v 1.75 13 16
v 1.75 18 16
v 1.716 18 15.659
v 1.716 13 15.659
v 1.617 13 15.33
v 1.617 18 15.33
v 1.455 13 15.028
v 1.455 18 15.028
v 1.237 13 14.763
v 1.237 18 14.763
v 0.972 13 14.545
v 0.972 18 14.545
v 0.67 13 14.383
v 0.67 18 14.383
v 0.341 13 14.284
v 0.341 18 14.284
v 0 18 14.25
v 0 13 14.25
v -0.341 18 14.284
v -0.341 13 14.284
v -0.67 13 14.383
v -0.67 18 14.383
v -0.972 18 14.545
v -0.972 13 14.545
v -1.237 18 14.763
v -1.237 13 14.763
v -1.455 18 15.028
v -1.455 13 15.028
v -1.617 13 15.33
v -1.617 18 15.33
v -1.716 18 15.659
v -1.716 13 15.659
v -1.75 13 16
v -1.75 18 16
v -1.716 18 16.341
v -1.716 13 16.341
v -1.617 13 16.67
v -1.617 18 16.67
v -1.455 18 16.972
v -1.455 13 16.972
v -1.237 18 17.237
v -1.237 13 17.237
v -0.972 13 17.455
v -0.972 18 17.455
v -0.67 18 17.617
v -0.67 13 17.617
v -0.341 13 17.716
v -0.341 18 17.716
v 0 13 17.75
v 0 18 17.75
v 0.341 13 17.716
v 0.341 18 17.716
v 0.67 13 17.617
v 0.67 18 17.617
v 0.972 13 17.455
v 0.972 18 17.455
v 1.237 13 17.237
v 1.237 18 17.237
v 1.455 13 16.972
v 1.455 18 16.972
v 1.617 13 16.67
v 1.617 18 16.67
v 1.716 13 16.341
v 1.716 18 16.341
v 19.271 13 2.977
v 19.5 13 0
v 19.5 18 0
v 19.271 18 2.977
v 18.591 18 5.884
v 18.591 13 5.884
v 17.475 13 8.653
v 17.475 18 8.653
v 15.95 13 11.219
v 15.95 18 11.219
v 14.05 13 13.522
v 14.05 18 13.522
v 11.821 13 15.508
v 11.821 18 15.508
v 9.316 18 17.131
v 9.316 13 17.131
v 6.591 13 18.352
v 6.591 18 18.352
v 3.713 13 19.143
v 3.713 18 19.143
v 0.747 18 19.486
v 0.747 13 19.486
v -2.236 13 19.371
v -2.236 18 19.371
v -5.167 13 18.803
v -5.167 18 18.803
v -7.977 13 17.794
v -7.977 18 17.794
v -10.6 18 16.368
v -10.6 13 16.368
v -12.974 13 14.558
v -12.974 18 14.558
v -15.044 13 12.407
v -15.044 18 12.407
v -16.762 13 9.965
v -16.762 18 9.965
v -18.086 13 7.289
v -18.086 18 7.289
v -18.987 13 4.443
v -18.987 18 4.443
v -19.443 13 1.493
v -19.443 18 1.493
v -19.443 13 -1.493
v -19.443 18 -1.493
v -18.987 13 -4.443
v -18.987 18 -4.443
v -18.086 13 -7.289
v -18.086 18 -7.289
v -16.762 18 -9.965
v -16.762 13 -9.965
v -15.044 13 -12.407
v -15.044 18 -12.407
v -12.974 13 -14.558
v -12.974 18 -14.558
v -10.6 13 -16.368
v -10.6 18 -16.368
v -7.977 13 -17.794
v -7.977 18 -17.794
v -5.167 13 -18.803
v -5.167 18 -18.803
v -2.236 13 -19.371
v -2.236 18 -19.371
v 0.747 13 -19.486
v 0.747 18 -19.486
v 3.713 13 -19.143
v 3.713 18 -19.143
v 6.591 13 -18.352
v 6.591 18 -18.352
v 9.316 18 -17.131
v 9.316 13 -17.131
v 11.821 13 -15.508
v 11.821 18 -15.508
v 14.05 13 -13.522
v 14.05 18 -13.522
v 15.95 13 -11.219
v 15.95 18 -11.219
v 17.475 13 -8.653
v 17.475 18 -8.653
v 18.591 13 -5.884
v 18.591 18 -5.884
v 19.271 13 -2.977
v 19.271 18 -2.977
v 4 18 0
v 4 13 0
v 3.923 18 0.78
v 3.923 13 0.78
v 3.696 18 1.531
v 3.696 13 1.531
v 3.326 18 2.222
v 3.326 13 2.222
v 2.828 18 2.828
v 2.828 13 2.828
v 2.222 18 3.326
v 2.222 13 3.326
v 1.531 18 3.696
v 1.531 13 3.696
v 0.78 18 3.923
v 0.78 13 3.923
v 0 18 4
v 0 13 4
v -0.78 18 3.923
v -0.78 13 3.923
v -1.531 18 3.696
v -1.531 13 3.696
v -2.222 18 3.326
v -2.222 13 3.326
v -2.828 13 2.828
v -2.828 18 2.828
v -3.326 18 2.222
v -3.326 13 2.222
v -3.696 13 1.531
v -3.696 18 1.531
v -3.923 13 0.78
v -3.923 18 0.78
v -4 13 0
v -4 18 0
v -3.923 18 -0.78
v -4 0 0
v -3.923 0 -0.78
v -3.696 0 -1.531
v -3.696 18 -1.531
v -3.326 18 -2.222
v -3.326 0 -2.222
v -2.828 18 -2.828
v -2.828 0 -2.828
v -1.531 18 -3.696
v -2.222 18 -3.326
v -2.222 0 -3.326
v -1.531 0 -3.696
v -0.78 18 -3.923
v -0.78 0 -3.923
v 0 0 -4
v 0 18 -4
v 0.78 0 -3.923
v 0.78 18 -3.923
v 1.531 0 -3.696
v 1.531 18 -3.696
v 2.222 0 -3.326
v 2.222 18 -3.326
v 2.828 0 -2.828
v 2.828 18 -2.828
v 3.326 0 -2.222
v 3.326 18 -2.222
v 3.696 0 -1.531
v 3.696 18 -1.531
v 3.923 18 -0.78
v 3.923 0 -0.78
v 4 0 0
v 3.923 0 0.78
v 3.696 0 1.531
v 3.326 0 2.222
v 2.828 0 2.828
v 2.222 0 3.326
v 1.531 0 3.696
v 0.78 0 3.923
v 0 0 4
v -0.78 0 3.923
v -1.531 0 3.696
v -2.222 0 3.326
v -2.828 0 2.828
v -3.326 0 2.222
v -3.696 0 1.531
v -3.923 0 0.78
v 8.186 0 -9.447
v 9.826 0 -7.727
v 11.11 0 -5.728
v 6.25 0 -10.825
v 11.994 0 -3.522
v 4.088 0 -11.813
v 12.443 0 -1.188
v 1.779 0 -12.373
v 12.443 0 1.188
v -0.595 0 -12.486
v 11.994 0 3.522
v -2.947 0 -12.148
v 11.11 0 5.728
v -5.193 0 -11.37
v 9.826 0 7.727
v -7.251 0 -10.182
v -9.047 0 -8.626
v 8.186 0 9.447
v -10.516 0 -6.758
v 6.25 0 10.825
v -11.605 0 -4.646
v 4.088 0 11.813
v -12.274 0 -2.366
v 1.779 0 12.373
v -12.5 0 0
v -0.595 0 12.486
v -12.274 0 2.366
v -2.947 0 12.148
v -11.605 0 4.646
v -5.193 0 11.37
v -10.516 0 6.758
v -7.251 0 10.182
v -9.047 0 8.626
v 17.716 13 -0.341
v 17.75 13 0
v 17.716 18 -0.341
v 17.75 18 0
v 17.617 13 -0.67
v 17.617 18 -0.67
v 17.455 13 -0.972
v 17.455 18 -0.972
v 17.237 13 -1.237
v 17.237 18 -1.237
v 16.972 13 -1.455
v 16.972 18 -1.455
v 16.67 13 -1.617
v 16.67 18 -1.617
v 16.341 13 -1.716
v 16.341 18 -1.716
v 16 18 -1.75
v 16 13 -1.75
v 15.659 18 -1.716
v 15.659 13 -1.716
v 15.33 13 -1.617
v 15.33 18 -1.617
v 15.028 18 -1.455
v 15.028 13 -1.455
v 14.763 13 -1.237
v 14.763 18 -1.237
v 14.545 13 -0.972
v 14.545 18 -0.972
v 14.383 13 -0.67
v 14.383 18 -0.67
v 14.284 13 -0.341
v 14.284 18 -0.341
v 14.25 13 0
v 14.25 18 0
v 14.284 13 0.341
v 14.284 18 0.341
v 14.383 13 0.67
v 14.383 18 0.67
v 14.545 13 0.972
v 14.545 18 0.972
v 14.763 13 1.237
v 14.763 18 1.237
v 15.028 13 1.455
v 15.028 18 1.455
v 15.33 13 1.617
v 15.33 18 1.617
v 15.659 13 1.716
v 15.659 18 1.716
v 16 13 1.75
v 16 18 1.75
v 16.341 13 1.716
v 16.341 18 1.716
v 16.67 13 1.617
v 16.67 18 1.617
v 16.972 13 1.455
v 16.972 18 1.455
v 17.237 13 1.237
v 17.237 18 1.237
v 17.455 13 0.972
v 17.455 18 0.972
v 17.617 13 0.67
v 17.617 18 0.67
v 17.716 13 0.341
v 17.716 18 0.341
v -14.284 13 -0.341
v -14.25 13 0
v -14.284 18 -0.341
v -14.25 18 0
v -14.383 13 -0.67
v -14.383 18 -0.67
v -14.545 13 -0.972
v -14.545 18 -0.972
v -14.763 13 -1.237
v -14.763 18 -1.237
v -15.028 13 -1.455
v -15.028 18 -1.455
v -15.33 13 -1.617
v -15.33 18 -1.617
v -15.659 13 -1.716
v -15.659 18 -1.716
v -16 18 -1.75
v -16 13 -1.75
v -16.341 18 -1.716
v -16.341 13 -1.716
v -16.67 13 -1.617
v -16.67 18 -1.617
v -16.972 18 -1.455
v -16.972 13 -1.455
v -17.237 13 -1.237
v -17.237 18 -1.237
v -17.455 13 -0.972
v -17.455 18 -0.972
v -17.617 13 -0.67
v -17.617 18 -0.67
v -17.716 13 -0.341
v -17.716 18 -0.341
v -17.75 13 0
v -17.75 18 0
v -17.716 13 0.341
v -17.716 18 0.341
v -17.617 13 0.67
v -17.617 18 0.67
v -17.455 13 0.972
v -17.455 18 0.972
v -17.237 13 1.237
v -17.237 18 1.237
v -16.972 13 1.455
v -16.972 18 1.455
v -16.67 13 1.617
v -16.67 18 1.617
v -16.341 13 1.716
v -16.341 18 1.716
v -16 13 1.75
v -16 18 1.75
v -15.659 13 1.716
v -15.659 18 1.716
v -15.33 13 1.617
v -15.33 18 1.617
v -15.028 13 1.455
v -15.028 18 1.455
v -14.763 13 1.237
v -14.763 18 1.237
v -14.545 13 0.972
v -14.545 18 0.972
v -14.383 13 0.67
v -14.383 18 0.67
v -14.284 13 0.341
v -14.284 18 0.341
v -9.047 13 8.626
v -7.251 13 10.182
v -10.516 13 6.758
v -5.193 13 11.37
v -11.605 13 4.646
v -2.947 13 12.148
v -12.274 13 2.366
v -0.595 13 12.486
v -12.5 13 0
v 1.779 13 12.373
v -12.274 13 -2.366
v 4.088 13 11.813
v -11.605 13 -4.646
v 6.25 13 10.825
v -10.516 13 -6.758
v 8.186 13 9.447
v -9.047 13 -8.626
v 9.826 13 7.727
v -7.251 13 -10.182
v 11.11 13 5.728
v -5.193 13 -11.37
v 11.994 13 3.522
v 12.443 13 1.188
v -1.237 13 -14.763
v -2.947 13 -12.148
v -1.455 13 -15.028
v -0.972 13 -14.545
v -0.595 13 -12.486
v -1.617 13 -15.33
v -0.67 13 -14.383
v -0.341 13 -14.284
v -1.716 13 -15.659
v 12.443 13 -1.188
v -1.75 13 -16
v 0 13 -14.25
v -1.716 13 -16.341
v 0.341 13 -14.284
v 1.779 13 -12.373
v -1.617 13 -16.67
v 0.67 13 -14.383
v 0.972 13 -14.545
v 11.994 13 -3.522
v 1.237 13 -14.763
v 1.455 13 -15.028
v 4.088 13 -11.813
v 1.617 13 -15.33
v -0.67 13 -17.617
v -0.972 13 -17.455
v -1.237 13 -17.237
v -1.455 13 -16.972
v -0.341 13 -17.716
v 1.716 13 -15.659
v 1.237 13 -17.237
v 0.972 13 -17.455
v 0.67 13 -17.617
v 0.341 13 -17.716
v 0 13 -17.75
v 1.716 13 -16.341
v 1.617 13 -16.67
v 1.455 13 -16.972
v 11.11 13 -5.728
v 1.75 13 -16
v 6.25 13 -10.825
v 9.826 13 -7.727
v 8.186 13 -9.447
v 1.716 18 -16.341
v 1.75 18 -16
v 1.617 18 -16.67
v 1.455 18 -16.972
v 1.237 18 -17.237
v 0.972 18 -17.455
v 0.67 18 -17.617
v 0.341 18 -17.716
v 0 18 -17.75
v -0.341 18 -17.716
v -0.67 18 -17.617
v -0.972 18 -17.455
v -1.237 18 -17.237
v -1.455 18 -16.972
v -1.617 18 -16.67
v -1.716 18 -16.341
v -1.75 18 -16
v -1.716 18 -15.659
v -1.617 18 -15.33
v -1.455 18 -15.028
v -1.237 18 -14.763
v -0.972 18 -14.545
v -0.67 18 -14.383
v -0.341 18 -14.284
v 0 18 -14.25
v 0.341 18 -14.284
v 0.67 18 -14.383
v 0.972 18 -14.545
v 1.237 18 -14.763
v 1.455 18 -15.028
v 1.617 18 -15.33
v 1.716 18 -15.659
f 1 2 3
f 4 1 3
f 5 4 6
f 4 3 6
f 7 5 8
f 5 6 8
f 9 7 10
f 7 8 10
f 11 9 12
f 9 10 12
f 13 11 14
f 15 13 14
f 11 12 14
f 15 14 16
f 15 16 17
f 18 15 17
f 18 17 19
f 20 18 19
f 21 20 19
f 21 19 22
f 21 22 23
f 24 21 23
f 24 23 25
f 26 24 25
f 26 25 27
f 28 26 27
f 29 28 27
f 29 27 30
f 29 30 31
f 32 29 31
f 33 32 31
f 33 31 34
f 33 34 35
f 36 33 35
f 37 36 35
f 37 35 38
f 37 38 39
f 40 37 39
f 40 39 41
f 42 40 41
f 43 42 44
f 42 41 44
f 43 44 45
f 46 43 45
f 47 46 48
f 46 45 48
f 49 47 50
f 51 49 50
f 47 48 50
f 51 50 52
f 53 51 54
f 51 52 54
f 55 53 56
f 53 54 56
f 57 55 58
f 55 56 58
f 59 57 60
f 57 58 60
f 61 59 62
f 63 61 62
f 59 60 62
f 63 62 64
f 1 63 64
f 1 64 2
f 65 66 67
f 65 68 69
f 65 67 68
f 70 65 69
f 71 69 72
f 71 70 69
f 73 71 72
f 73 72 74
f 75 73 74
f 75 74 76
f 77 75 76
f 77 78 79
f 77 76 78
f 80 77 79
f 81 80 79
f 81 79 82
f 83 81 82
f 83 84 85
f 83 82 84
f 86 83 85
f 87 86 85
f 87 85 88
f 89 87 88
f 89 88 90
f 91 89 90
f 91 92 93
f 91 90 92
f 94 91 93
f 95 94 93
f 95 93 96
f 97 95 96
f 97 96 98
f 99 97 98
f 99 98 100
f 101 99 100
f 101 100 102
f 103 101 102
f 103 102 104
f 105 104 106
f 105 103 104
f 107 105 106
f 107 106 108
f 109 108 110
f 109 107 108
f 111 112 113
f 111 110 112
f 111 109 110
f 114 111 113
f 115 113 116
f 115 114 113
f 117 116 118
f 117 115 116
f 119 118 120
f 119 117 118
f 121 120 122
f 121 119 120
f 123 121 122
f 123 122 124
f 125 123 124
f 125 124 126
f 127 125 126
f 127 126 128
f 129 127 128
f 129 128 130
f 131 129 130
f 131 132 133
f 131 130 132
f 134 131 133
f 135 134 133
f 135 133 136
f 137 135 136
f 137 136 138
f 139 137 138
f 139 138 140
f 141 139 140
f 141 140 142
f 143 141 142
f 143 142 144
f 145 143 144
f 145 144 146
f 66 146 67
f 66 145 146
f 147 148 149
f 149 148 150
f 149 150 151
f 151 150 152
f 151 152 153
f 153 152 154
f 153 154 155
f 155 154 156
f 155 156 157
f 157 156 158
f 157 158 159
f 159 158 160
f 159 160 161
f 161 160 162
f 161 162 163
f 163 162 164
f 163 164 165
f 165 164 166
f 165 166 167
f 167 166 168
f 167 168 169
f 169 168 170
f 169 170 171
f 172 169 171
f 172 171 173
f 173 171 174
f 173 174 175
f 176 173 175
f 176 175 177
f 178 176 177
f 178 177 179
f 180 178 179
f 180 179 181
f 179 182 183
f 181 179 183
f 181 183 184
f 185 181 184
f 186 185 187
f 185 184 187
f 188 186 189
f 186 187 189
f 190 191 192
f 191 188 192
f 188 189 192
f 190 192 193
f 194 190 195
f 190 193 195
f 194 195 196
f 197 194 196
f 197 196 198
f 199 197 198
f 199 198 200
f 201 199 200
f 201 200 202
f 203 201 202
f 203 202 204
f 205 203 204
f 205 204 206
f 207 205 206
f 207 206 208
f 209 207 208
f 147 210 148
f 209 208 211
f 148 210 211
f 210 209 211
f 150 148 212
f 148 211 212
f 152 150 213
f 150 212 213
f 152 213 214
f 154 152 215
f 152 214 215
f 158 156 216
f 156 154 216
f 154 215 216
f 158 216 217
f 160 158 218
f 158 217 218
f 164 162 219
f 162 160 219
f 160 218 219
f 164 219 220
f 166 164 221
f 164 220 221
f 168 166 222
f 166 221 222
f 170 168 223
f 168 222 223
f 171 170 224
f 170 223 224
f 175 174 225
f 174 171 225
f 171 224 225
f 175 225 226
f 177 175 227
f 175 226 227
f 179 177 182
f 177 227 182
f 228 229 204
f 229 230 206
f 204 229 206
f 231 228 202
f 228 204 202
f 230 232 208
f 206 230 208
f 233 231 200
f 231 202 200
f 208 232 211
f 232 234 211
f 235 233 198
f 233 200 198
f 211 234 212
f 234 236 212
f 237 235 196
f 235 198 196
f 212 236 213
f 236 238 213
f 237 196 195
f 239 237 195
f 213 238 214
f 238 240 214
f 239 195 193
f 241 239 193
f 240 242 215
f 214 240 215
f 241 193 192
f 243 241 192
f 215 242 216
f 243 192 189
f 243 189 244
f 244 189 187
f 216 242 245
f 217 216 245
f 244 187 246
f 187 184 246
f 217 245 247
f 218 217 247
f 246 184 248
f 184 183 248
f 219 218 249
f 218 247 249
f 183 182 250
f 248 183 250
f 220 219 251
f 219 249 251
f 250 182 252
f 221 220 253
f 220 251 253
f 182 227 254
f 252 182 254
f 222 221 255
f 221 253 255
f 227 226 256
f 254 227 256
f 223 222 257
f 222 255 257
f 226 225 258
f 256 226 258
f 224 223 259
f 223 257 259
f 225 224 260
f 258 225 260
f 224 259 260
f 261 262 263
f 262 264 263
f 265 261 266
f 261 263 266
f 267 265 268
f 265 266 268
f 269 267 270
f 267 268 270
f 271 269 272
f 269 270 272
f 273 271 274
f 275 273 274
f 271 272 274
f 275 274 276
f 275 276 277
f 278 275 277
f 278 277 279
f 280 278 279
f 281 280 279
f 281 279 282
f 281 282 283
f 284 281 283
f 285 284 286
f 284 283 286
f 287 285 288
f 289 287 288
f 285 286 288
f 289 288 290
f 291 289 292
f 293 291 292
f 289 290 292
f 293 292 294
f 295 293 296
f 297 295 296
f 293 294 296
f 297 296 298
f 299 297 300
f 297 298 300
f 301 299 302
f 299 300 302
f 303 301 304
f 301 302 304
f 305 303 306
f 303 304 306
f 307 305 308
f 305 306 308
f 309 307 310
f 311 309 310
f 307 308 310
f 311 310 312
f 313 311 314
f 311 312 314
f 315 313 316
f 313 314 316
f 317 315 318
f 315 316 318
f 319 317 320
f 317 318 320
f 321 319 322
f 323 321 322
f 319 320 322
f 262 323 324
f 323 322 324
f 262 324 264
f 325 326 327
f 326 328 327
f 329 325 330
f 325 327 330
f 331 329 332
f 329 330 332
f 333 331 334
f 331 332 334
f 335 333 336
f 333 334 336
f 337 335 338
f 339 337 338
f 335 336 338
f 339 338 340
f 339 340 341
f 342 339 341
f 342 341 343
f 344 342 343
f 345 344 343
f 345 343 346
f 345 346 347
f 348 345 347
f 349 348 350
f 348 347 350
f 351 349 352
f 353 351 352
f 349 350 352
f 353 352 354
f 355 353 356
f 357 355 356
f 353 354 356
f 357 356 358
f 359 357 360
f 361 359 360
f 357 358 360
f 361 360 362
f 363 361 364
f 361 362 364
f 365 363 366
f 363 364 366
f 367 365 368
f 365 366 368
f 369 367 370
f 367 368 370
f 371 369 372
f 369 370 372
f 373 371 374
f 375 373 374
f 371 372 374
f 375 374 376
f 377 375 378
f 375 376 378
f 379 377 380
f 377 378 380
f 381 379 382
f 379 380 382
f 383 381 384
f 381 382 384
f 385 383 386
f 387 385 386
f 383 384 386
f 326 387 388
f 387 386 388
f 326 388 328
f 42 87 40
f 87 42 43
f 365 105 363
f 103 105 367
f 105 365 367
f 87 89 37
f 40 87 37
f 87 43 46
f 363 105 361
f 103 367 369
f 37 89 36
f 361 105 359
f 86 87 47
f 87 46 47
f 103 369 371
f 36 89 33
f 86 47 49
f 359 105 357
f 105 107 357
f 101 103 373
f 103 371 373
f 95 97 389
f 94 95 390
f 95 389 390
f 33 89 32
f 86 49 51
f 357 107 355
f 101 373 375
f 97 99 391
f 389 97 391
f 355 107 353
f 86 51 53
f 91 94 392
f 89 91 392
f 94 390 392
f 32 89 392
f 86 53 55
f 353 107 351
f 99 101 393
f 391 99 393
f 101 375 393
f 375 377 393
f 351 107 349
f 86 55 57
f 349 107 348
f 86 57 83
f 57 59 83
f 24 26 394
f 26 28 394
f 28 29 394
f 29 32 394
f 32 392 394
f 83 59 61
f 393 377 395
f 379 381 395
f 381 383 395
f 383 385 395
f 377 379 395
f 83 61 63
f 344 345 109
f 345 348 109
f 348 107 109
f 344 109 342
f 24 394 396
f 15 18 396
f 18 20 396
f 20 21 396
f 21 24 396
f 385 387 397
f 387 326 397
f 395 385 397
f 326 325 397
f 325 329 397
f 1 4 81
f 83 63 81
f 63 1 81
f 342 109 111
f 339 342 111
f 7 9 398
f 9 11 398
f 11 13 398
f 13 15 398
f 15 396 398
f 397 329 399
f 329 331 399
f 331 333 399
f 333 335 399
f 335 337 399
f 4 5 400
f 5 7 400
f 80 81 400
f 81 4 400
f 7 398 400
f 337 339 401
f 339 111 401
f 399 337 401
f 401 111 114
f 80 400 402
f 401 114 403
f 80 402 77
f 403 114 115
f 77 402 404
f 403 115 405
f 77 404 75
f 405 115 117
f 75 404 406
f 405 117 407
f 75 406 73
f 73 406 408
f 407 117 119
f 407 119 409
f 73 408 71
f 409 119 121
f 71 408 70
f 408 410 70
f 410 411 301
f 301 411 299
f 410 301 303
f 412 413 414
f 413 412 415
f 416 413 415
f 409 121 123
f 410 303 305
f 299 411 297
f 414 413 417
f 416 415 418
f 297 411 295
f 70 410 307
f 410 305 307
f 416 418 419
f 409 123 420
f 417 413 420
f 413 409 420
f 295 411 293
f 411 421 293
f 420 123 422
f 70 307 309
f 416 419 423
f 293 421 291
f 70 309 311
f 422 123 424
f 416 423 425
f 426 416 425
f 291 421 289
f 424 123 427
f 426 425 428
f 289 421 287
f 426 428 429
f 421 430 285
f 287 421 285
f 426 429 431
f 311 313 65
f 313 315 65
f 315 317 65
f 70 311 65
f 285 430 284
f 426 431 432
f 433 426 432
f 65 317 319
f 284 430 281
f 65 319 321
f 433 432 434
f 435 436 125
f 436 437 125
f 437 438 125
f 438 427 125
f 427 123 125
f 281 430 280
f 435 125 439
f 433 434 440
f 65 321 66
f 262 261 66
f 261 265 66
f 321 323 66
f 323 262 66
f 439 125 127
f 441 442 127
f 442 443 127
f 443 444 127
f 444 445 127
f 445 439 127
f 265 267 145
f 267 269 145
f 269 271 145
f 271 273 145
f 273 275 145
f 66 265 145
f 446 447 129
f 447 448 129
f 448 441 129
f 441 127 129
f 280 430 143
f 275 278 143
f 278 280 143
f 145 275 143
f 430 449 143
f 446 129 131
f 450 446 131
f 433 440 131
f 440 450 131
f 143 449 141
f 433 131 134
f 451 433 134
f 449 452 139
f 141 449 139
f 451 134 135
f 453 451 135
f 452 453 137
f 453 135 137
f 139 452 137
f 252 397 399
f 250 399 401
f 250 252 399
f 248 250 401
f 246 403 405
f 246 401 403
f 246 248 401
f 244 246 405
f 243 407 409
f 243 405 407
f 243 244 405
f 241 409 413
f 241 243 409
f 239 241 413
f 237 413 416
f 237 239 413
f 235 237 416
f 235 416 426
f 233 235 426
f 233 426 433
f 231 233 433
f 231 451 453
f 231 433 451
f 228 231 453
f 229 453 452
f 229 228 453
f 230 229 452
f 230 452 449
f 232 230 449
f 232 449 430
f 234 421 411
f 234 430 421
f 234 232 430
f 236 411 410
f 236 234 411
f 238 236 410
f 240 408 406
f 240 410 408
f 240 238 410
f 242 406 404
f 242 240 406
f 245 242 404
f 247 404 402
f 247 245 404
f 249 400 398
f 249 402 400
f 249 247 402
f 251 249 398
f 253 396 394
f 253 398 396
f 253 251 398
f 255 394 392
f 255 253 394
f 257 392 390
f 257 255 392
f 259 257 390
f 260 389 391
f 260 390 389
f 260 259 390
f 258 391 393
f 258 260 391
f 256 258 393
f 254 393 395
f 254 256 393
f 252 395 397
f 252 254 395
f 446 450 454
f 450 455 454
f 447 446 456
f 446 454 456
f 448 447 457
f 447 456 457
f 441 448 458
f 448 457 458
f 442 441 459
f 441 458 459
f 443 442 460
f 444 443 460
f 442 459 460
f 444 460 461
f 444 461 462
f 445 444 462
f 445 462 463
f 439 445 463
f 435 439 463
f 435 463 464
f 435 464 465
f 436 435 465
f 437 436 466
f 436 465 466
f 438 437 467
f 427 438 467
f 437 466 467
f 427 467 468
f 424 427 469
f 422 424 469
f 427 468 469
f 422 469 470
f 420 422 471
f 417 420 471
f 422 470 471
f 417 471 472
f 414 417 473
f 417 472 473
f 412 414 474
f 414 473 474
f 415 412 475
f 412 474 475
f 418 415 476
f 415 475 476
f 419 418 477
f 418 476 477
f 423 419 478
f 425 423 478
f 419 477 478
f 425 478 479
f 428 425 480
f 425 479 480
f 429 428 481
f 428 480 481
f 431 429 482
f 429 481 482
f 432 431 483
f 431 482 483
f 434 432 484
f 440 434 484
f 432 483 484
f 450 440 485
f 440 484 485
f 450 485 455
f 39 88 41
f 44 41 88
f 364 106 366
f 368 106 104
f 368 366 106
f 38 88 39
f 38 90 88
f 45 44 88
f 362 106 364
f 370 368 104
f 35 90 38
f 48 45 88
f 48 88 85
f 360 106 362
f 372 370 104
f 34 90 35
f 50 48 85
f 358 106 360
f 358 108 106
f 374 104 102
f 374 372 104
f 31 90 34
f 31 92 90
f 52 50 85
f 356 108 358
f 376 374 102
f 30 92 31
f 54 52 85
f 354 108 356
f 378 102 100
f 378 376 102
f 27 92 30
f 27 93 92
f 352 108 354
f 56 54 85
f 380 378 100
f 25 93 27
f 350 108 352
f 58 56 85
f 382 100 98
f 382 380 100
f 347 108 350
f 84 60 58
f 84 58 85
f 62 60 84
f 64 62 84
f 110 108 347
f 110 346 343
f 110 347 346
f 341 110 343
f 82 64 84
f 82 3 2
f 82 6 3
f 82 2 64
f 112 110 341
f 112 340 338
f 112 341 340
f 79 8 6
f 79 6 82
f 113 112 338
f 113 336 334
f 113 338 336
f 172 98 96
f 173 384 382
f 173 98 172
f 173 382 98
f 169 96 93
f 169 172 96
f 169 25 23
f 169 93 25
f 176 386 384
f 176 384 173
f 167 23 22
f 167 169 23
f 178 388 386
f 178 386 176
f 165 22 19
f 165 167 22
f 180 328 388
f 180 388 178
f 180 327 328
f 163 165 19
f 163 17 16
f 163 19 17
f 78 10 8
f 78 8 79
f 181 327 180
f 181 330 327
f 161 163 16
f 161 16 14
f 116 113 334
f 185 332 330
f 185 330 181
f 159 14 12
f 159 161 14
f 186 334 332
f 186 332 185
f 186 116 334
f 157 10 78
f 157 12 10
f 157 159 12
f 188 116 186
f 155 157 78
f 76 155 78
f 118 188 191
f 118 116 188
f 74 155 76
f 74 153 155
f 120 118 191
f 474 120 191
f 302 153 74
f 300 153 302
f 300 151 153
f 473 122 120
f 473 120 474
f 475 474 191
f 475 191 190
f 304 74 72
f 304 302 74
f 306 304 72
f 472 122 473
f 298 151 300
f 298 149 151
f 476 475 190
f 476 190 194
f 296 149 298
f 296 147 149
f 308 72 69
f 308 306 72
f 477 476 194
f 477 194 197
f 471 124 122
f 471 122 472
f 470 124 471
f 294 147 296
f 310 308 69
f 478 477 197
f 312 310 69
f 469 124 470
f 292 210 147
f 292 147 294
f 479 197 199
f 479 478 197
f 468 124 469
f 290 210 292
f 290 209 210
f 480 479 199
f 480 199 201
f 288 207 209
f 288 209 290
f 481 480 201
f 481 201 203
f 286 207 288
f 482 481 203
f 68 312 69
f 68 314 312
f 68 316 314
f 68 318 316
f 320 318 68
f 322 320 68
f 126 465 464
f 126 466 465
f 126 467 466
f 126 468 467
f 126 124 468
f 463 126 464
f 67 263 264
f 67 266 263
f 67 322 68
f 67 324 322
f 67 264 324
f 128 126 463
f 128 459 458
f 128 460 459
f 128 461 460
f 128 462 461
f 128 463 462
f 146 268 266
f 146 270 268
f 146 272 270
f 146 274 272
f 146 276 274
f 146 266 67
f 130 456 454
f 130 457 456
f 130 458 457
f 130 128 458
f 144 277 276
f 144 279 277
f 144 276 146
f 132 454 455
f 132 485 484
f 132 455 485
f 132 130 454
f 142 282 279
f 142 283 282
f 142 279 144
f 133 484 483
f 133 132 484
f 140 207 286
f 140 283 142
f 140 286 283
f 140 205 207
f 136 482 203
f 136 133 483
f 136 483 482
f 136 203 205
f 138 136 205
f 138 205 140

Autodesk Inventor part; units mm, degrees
ref_plane "YZ Plane" through (0, 0, 0) normal (1, 0, 0) x (0, 1, 0)
ref_plane "XZ Plane" through (0, 0, 0) normal (0, 1, 0) x (-1, 0, 0)
ref_plane "XY Plane" through (0, 0, 0) normal (0, 0, 1) x (1, 0, 0)
sketch "草圖1" plane through (0, 0, 0) normal (0, 1, 0) x (-1, 0, 0)
  circle A0 centre (0, 0) radius 4
  circle A1 centre (0, 0) radius 12.5
  dimension "d0" = 8
  dimension "d1" = 25
extrude "擠出1" add sketch "草圖1" along normal blind 13
sketch "草圖2" plane through (0, 13, 0) normal (0, 1, 0) x (1, 0, 0)
  circle A0 centre (0, 0) radius 19.5
  circle A1 centre (0, 0) radius 4 projected
  dimension "d4" = 39
extrude "擠出2" add sketch "草圖2" along normal blind 5
sketch "草圖3" plane through (0, 18, 0) normal (0, 1, 0) x (1, 0, 0)
  circle A0 centre (0, 0) radius 16 construction
  circle A1 centre (-16, 0) radius 1.75
  circle A2 centre (0, -16) radius 1.75
  circle A3 centre (16, 0) radius 1.75
  circle A4 centre (0, 16) radius 1.75
  dimension "d7" = 32
  dimension "d8" = 3.5
  dimension "d11" = 360
extrude "擠出3" cut sketch "草圖3" against normal blind 5
properties part number "8 mm hub"
